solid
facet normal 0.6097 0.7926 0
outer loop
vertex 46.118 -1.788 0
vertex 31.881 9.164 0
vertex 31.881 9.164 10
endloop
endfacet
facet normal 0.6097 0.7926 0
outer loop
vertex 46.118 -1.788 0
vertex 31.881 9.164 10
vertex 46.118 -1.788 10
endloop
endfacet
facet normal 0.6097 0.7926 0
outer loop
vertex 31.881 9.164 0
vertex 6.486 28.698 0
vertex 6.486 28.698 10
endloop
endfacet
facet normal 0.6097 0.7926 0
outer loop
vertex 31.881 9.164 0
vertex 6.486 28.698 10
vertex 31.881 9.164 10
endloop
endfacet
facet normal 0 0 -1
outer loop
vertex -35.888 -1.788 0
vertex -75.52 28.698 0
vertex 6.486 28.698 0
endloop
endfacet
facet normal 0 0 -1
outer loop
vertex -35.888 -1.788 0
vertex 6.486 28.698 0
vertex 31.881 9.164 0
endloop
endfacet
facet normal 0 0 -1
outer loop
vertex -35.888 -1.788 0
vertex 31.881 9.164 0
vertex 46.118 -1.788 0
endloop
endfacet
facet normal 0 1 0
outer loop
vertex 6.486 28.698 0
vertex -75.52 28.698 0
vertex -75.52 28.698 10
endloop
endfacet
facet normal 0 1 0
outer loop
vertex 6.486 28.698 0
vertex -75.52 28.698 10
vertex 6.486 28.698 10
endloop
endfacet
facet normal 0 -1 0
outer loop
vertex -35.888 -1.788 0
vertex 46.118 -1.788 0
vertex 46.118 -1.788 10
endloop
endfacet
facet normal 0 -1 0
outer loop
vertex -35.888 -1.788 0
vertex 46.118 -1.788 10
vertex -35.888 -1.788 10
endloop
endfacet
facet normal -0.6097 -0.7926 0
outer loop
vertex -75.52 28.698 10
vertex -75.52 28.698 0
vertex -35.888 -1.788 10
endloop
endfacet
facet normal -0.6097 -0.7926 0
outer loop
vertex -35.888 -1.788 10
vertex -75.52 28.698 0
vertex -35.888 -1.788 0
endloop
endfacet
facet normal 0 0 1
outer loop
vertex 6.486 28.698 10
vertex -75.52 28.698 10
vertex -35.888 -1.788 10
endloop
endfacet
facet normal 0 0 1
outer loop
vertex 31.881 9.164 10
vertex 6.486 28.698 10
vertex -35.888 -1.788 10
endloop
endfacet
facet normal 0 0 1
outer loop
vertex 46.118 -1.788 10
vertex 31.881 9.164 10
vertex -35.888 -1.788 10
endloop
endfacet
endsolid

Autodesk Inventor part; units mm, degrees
ref_plane "YZ Plane" through (0, 0, 0) normal (1, 0, 0) x (0, 1, 0)
ref_plane "XZ Plane" through (0, 0, 0) normal (0, 1, 0) x (-1, 0, 0)
ref_plane "XY Plane" through (0, 0, 0) normal (0, 0, 1) x (1, 0, 0)
sketch "Boceto1" plane through (0, 0, 0) normal (0, 0, 1) x (1, 0, 0)
  line L0 (-75.5202, 28.6978) -> (6.4858, 28.6978)
  line L1 (46.1178, -1.7877) -> (-35.8882, -1.7877)
  line L2 (-75.5202, 28.6978) -> (-35.8882, -1.7877)
  line L3 (-35.8882, -1.7877) -> (-35.8882, -1.7877)
  line L4 (6.4858, 28.6978) -> (31.8808, 9.1636)
  line L5 (31.8808, 9.1636) -> (46.1178, -1.7877)
  line L6 (-35.8882, -1.7877) -> (-20.031, -13.9853)
  point P0 (0, 0)
  point P1 (-35.8882, -1.7877)
  dimension "d3" = 82.006
  dimension "d13" = 37.568
  dimension "d14" = 37.568
  dimension "d15" = 30.4855
extrude "Extrusión1" add sketch "Boceto1" along normal blind 10
properties part number "Brazo_C" material "Hierro, fundido"
